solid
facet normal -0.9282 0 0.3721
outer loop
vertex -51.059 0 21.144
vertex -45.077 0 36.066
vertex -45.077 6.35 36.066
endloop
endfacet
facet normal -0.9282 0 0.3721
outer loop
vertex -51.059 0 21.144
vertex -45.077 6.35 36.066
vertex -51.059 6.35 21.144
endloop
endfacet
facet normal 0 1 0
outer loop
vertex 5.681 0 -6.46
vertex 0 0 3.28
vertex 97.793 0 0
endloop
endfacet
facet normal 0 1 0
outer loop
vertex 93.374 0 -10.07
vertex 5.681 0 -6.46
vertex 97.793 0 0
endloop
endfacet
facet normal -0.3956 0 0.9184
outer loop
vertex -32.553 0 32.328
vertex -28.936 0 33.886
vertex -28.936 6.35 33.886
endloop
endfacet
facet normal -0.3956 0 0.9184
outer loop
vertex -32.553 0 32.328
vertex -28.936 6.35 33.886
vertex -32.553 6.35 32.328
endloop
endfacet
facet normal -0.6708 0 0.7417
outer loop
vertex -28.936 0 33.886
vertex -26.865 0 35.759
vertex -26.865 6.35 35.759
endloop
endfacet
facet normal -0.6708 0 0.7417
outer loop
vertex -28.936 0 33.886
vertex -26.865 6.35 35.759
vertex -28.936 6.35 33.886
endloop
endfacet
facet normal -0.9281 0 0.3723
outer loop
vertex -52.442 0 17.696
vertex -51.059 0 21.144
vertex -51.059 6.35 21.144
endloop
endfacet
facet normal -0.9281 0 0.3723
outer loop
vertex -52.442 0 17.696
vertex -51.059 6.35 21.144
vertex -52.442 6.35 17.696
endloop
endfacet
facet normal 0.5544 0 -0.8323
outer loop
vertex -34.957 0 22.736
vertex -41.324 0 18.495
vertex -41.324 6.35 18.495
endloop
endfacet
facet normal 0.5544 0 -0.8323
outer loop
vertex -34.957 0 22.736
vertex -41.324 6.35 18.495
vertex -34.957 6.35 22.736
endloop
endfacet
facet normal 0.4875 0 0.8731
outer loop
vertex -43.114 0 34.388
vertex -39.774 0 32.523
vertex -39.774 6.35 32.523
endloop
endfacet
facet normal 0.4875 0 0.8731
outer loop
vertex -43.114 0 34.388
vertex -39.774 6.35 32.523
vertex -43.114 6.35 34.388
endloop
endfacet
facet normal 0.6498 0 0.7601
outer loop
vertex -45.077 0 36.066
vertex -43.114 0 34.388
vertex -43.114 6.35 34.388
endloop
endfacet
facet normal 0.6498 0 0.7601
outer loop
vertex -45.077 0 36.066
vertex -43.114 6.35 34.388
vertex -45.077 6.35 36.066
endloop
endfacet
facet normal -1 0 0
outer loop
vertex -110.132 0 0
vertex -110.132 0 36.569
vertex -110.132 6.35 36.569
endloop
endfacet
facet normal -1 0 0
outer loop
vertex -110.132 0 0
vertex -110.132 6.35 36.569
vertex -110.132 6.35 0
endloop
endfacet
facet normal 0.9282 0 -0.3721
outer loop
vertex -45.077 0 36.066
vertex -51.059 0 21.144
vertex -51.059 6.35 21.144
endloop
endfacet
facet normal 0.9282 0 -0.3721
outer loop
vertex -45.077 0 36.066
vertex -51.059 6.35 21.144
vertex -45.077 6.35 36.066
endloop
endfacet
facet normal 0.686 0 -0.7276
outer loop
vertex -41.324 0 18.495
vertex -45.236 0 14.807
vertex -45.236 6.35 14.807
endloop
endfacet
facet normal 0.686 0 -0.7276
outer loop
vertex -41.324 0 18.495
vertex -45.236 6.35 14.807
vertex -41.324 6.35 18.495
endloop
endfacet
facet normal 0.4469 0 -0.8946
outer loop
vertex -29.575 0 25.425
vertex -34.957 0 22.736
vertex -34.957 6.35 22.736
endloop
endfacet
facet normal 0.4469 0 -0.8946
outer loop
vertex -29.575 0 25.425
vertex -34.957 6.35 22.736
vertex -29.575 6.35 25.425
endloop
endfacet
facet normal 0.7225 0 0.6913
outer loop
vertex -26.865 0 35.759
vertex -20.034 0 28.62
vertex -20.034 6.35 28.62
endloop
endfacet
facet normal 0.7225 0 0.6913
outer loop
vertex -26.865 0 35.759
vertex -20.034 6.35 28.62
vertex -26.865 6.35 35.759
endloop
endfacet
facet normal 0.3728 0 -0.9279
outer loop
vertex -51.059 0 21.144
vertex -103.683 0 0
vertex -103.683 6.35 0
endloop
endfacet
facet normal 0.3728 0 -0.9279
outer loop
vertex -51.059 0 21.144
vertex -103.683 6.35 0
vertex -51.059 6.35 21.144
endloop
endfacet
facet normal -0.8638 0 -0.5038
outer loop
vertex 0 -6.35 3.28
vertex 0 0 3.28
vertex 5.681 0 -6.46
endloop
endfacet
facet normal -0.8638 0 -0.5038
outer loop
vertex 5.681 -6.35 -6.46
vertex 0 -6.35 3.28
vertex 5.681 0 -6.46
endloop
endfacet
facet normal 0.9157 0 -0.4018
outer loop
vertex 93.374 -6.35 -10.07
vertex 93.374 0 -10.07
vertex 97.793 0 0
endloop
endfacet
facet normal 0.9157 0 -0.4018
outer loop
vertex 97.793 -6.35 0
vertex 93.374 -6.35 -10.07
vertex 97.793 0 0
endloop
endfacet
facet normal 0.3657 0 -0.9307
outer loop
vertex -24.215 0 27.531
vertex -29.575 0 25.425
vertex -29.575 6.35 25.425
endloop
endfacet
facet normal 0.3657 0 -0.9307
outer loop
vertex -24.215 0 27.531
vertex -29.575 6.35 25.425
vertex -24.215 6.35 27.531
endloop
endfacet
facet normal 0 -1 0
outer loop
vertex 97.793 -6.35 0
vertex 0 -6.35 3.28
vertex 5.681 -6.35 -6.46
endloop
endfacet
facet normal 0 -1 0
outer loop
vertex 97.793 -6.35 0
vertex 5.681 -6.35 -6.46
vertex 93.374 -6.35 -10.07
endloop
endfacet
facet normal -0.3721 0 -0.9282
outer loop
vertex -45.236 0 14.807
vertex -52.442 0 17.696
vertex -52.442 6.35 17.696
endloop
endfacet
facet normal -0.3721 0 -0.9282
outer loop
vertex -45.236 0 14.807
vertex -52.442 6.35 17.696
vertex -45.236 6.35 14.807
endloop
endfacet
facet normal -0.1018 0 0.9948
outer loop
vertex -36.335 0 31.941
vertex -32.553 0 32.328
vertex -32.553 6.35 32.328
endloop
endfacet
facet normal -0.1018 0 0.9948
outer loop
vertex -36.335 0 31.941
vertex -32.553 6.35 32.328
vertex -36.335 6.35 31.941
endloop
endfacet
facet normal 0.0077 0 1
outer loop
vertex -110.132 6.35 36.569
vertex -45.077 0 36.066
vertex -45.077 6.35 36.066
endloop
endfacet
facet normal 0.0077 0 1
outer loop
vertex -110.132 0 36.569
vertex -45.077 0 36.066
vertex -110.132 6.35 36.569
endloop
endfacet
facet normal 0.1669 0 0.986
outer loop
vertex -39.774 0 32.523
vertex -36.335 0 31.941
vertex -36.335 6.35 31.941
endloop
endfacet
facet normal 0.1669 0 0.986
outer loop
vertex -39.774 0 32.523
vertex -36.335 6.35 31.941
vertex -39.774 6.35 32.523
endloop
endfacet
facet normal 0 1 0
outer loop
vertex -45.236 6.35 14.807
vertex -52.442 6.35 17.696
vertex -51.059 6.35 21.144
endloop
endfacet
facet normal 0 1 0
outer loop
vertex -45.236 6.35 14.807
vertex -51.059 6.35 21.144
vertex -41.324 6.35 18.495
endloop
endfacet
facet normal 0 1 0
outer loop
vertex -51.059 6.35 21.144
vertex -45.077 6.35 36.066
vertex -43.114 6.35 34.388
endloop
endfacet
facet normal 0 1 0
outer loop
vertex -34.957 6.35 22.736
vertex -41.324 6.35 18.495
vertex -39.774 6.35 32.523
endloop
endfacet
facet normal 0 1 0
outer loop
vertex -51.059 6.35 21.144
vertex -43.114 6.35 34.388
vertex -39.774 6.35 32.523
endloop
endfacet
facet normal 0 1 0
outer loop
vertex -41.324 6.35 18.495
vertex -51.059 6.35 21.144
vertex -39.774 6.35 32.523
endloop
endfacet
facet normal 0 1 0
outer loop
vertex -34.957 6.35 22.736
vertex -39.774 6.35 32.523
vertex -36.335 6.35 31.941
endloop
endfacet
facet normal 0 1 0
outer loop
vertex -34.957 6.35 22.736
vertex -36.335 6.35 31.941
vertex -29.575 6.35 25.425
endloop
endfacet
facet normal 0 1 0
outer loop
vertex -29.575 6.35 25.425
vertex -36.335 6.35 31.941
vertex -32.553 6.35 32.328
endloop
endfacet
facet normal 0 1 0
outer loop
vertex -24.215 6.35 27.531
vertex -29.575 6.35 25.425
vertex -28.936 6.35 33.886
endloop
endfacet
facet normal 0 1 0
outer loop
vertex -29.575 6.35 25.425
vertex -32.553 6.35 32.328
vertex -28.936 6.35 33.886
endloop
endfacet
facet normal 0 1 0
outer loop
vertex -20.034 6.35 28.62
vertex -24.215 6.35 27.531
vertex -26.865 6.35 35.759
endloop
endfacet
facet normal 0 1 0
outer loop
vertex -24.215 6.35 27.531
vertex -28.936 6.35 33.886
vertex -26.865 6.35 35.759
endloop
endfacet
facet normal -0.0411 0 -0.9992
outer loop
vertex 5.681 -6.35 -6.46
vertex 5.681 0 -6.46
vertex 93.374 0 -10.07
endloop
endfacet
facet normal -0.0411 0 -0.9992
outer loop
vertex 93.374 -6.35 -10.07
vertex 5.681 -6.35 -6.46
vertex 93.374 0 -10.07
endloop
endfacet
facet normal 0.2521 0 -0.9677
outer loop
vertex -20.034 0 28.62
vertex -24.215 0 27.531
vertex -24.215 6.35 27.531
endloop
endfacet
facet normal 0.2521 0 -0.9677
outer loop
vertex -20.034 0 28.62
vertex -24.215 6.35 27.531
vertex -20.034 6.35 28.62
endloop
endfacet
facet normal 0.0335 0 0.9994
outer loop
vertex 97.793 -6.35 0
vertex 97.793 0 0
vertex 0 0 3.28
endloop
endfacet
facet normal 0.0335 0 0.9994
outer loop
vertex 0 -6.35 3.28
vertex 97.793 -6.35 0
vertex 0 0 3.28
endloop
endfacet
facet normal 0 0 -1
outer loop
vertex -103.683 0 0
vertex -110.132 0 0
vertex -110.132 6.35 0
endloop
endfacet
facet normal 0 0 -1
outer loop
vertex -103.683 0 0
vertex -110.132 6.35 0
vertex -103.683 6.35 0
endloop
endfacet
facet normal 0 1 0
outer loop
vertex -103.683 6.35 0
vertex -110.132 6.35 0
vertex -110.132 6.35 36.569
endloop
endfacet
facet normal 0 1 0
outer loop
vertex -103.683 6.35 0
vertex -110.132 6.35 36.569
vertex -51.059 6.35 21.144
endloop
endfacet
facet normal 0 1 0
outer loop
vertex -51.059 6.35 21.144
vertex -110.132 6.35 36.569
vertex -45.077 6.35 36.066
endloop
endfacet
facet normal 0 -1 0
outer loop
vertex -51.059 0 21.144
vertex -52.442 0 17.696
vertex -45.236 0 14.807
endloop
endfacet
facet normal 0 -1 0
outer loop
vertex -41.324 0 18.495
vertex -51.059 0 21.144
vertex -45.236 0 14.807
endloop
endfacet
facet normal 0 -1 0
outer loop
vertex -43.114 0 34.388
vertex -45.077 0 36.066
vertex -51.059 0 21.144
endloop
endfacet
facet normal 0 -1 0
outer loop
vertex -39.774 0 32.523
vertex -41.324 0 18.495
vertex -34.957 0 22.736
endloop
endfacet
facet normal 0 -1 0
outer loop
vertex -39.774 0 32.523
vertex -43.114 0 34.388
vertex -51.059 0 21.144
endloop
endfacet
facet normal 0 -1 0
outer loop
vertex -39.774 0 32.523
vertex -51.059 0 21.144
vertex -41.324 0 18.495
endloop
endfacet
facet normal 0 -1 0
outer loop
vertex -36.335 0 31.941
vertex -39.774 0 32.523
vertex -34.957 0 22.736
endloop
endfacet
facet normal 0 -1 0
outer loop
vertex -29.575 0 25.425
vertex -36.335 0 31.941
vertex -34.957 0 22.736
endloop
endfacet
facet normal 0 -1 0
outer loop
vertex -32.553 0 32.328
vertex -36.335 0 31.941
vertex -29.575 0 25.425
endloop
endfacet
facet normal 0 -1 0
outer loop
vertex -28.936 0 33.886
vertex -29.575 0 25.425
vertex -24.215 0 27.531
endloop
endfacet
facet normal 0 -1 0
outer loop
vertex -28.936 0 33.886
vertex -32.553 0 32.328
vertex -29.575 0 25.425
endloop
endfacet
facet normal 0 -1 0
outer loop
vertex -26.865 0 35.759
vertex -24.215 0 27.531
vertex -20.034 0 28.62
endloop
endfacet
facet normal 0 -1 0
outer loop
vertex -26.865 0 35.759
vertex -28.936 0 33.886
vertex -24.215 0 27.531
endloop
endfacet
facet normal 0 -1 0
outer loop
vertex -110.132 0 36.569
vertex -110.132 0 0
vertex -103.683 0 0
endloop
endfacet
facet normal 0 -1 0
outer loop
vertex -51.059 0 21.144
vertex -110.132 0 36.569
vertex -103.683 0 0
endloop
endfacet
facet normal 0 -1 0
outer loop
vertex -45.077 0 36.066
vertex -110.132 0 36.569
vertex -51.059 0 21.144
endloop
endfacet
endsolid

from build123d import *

# Parameters (mm, degrees)
F2_DEPTH = 6.35
F4_DEPTH = 6.35


with BuildPart() as f2:
    # F1 (on face) → F2 (new body)
    with BuildSketch(Plane.XZ):
        Polygon((-51.0594704005, 21.1444481476), (-45.0766035008, 36.0660873469), (-110.1323738694, 36.5694032435), (-110.1323738694, 0), (-103.6829250218, 0), align=None)
    extrude(amount=-F2_DEPTH)


with BuildPart() as f2b:
    # F0 (on Front) → F2, piece 2 (new body)
    with BuildSketch(Plane.XZ):
        Polygon((-43.1138053536, 34.3882204033), (-45.0766035008, 36.0660873469), (-51.0594704005, 21.1444481476), (-52.4420491249, 17.6962115019), (-45.2361473337, 14.8069879566), (-41.3237065077, 18.495129887), (-34.9567681551, 22.7355235256), (-29.5745804906, 25.4249968566), (-24.2146775126, 27.5306520052), (-20.0344100595, 28.6203236319), (-26.8648415804, 35.7585237361), (-28.9359614253, 33.8858165778), (-32.5532332063, 32.3276096024), (-36.3345146179, 31.9414720871), (-39.7744849324, 32.5234369375), align=None)
    extrude(amount=-F2_DEPTH)


with BuildPart() as f4:
    # F3 (on Front) → F4 (new body)
    with BuildSketch(Plane.XZ):
        Polygon((97.7926607244, 0), (0, 3.2795594294), (5.6813200936, -6.4599663019), (93.374453485, -10.0703090429), align=None)
    extrude(amount=F4_DEPTH)


solid = Compound([f2.part, f2b.part, f4.part])
